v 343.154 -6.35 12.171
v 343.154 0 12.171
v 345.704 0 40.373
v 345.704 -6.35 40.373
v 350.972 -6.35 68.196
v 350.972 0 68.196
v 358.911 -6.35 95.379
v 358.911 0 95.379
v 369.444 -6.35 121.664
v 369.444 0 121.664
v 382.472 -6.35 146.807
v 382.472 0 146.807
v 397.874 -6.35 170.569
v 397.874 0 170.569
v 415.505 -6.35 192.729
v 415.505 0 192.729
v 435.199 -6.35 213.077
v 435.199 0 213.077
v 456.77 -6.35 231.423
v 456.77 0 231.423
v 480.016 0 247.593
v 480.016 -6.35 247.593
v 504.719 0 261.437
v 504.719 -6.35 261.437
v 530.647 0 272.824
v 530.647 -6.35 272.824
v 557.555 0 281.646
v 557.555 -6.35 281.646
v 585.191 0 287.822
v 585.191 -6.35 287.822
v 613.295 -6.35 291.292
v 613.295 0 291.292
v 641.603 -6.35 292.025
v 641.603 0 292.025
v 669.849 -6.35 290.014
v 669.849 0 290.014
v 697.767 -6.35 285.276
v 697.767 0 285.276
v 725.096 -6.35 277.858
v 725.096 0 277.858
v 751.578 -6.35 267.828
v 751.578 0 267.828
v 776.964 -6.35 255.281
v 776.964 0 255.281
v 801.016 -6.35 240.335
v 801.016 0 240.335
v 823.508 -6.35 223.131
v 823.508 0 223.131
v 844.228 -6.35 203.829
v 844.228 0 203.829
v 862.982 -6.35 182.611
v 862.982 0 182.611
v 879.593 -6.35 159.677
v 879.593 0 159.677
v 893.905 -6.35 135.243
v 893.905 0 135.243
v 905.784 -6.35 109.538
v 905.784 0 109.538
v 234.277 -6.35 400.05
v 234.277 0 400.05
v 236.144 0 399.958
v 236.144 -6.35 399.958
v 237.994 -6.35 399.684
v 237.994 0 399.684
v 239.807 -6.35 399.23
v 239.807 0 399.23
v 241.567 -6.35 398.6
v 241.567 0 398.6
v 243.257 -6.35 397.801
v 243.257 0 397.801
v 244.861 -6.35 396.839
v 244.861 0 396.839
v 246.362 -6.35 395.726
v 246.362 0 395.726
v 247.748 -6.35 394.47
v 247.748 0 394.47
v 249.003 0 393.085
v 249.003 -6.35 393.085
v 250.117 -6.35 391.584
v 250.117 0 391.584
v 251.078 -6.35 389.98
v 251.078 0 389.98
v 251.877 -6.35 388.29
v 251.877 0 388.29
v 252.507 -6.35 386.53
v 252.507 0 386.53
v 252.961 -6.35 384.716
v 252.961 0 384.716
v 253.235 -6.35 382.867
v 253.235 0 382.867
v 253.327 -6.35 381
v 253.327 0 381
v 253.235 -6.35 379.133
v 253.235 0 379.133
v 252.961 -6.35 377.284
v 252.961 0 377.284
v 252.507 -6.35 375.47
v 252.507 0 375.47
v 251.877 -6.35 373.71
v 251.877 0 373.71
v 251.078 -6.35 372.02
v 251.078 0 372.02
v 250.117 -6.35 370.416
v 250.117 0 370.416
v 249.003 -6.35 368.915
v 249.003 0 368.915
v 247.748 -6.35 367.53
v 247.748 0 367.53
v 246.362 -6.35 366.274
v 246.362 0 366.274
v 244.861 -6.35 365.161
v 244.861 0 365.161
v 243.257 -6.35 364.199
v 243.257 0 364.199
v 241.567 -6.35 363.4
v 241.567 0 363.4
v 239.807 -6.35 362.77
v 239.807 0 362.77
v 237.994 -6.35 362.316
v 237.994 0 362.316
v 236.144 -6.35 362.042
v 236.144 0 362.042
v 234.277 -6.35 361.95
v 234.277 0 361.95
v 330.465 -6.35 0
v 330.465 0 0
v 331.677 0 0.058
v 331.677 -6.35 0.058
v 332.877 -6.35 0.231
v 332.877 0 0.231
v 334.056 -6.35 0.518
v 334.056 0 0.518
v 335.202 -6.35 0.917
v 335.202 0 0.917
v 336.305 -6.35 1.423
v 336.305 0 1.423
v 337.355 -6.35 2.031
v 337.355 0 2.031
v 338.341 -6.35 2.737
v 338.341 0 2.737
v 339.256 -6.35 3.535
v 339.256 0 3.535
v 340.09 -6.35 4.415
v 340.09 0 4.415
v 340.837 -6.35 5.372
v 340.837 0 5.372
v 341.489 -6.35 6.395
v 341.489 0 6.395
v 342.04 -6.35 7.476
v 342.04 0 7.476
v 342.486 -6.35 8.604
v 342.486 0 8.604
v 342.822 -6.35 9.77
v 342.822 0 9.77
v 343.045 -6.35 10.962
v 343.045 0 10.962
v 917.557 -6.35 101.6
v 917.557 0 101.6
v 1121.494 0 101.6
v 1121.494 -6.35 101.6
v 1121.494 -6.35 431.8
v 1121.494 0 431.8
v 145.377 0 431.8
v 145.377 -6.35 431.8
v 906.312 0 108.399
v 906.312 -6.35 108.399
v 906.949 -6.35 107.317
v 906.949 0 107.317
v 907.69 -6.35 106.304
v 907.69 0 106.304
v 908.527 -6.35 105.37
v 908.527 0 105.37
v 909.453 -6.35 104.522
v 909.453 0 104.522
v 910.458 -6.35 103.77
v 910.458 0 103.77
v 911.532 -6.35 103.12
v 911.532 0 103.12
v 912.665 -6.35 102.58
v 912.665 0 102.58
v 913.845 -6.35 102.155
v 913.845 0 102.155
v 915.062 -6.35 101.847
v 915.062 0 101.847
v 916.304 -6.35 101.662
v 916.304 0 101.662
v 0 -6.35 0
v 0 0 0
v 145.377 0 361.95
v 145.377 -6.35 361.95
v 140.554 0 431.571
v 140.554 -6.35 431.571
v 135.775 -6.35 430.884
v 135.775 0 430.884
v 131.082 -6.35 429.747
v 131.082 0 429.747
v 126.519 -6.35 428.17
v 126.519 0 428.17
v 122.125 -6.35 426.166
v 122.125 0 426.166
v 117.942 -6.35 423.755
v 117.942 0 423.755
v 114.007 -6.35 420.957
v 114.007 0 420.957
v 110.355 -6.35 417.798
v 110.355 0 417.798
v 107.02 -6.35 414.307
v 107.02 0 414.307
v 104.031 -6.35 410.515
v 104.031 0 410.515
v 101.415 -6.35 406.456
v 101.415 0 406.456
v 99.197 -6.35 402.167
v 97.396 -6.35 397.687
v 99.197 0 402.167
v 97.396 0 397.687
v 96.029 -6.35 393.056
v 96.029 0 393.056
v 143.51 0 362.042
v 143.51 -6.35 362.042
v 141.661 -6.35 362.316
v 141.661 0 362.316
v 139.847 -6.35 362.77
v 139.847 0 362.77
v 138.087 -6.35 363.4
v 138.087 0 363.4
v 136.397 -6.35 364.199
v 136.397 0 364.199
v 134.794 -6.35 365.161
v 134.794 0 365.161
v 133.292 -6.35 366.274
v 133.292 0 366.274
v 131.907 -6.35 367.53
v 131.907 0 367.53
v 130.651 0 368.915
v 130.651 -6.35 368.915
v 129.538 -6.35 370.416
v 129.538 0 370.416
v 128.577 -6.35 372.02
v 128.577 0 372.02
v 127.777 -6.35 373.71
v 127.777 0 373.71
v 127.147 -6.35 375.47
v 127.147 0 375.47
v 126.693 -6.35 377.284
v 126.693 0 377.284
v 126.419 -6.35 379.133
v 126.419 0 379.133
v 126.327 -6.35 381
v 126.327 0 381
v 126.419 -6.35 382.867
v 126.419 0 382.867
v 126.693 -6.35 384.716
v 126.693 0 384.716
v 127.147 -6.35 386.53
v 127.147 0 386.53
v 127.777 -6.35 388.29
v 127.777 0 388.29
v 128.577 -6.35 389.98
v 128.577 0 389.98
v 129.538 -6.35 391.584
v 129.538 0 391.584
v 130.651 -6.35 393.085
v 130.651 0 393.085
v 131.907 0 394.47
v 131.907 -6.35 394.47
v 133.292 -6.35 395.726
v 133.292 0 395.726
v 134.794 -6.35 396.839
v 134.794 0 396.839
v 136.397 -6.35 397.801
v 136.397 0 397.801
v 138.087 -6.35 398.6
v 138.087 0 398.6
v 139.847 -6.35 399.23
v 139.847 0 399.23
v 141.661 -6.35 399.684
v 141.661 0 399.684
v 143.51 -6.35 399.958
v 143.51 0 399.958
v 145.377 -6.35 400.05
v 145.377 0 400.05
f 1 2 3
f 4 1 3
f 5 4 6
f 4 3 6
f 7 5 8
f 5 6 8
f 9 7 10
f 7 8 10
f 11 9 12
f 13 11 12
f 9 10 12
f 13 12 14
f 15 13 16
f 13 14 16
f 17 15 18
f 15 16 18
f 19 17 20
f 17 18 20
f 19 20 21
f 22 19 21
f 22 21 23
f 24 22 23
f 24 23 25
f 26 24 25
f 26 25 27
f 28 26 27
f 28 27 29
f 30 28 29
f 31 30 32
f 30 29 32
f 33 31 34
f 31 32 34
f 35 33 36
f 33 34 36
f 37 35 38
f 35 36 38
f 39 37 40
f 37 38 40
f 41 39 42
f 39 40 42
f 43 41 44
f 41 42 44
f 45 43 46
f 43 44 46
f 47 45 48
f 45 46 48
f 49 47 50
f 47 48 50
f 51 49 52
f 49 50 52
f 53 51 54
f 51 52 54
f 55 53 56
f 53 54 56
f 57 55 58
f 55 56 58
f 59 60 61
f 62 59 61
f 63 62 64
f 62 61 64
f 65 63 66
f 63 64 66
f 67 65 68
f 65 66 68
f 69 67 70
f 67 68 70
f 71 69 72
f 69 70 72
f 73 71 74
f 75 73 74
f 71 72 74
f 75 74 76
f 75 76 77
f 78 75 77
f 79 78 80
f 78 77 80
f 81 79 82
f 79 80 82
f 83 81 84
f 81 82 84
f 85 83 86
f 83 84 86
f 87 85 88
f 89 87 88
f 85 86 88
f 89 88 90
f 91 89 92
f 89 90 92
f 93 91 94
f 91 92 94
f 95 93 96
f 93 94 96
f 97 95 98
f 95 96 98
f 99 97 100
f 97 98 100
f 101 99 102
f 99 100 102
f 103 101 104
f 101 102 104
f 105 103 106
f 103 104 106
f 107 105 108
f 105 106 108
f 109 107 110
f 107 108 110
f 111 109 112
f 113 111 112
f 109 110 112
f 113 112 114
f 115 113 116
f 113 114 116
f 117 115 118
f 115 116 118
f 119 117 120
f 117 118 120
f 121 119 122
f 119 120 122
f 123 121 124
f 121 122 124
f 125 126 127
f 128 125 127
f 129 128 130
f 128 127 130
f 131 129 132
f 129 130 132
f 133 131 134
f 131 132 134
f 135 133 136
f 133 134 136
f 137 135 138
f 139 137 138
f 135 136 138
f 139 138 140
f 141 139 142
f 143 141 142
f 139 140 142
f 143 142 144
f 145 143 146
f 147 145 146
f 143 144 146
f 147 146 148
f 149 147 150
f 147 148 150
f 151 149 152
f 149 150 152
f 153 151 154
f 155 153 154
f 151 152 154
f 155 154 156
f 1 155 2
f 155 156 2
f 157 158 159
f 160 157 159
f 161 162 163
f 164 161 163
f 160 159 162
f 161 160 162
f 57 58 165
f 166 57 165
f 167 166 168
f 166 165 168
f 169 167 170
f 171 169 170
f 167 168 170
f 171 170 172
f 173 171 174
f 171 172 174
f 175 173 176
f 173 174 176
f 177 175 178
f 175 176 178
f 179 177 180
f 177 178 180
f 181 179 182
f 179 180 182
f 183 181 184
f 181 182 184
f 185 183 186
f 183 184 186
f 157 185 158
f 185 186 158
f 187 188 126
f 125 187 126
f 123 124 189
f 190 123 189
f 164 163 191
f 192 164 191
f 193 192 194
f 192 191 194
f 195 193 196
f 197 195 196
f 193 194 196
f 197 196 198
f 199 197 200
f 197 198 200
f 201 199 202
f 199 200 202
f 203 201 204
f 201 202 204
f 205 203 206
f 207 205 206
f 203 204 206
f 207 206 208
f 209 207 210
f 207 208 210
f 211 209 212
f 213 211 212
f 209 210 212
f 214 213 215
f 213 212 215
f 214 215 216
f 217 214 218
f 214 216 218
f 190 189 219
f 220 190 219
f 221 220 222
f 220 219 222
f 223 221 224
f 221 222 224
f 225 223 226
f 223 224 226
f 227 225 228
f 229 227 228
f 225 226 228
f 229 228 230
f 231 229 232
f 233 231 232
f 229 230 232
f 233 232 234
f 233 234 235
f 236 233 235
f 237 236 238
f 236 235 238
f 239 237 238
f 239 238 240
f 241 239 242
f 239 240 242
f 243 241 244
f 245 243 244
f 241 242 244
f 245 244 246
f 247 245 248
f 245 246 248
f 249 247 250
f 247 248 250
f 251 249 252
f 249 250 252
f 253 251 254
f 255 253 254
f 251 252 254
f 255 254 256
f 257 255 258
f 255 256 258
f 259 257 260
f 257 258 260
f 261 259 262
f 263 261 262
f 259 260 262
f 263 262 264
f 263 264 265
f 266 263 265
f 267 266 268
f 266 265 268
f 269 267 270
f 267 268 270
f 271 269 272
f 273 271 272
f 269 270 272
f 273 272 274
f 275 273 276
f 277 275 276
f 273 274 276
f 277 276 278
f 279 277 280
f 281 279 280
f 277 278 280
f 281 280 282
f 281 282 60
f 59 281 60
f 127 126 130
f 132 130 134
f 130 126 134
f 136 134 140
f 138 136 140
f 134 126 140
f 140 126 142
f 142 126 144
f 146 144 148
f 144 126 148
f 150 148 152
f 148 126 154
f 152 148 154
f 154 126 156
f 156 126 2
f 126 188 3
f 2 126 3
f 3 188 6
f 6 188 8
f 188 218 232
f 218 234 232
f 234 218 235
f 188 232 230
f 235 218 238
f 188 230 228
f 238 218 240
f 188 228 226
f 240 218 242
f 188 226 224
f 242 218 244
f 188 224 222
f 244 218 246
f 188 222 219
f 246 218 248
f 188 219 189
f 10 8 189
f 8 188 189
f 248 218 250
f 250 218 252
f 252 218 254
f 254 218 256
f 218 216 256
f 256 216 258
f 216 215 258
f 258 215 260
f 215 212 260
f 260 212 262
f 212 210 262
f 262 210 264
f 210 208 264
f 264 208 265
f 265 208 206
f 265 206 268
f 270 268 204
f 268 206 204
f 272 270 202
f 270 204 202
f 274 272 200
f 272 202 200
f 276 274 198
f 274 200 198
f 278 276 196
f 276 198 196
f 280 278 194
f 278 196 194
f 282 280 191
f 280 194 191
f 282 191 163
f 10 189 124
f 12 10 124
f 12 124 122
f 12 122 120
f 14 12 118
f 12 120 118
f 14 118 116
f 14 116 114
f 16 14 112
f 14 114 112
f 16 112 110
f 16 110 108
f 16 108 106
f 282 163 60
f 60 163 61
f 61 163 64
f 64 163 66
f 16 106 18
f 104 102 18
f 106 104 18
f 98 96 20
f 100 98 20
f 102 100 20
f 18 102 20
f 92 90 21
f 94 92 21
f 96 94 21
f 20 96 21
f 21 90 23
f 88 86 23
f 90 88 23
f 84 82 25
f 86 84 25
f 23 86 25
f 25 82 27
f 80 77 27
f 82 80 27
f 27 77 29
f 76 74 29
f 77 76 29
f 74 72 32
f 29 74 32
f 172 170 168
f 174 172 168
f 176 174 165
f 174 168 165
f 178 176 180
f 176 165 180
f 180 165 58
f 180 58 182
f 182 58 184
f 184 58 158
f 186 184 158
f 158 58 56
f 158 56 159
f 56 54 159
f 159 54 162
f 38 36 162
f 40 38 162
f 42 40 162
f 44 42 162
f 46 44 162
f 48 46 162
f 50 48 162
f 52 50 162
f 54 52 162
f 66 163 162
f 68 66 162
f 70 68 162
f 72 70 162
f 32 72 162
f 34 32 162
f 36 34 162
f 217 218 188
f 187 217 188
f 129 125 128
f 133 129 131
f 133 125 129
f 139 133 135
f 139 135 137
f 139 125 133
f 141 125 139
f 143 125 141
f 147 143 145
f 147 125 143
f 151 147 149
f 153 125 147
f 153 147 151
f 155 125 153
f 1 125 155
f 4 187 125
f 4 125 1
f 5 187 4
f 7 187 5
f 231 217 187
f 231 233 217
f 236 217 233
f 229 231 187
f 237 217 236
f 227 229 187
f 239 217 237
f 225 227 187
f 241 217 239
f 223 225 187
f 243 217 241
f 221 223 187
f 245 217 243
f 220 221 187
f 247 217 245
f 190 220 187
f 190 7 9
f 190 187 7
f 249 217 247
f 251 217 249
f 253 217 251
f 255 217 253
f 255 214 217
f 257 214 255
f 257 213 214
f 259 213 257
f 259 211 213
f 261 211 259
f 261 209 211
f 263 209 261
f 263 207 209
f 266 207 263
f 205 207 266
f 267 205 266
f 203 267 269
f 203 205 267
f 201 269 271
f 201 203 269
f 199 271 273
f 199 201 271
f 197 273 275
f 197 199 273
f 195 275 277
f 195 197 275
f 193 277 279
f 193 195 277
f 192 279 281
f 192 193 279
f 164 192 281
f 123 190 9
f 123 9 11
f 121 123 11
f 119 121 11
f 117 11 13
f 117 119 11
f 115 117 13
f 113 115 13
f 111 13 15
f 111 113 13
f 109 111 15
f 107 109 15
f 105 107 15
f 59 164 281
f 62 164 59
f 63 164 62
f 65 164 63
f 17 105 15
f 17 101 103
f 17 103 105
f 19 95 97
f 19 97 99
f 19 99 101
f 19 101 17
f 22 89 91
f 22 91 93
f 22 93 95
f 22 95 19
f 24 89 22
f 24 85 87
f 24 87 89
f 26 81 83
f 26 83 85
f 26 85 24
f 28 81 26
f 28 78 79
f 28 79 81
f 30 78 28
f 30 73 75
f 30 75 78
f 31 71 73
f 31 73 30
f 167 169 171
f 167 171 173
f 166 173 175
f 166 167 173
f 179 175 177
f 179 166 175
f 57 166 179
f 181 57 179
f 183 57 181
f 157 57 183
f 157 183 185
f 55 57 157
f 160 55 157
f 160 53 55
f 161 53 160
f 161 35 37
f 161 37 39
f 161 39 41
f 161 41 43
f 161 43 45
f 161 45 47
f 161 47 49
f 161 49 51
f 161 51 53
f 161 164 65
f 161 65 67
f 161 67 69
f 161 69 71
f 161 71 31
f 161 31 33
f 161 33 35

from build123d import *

# Parameters (mm, degrees)
F1_DEPTH = 6.35


with BuildPart() as f1:
    # F0 (on Front) → F1 (new body)
    with BuildSketch(Plane.XZ):
        with BuildLine():
            Line((96.028596, 393.056471), (0, 0))
            Line((0, 0), (330.464698, 0))
            ThreePointArc((330.464698, 0), (339.255875, 3.534564), (343.153669, 12.170833))
            ThreePointArc((343.153669, 12.170833), (585.190634, 287.821884), (905.783947, 109.5375))
            ThreePointArc((905.783947, 109.5375), (910.457647, 103.769716), (917.557162, 101.6))
            Line((917.557162, 101.6), (1121.494123, 101.6))
            Line((1121.494123, 101.6), (1121.494123, 431.8))
            Line((1121.494123, 431.8), (145.377167, 431.8))
            ThreePointArc((145.377167, 431.8), (114.007028, 420.956906), (96.028596, 393.056471))
        make_face()
        with BuildLine():
            ThreePointArc((145.377167, 361.95), (126.327167, 381), (145.377167, 400.05))
            Line((145.377167, 400.05), (234.277167, 400.05))
            ThreePointArc((234.277167, 400.05), (253.327167, 381), (234.277167, 361.95))
            Line((234.277167, 361.95), (145.377167, 361.95))
        make_face(mode=Mode.SUBTRACT)
    extrude(amount=F1_DEPTH)


solid = f1.part
